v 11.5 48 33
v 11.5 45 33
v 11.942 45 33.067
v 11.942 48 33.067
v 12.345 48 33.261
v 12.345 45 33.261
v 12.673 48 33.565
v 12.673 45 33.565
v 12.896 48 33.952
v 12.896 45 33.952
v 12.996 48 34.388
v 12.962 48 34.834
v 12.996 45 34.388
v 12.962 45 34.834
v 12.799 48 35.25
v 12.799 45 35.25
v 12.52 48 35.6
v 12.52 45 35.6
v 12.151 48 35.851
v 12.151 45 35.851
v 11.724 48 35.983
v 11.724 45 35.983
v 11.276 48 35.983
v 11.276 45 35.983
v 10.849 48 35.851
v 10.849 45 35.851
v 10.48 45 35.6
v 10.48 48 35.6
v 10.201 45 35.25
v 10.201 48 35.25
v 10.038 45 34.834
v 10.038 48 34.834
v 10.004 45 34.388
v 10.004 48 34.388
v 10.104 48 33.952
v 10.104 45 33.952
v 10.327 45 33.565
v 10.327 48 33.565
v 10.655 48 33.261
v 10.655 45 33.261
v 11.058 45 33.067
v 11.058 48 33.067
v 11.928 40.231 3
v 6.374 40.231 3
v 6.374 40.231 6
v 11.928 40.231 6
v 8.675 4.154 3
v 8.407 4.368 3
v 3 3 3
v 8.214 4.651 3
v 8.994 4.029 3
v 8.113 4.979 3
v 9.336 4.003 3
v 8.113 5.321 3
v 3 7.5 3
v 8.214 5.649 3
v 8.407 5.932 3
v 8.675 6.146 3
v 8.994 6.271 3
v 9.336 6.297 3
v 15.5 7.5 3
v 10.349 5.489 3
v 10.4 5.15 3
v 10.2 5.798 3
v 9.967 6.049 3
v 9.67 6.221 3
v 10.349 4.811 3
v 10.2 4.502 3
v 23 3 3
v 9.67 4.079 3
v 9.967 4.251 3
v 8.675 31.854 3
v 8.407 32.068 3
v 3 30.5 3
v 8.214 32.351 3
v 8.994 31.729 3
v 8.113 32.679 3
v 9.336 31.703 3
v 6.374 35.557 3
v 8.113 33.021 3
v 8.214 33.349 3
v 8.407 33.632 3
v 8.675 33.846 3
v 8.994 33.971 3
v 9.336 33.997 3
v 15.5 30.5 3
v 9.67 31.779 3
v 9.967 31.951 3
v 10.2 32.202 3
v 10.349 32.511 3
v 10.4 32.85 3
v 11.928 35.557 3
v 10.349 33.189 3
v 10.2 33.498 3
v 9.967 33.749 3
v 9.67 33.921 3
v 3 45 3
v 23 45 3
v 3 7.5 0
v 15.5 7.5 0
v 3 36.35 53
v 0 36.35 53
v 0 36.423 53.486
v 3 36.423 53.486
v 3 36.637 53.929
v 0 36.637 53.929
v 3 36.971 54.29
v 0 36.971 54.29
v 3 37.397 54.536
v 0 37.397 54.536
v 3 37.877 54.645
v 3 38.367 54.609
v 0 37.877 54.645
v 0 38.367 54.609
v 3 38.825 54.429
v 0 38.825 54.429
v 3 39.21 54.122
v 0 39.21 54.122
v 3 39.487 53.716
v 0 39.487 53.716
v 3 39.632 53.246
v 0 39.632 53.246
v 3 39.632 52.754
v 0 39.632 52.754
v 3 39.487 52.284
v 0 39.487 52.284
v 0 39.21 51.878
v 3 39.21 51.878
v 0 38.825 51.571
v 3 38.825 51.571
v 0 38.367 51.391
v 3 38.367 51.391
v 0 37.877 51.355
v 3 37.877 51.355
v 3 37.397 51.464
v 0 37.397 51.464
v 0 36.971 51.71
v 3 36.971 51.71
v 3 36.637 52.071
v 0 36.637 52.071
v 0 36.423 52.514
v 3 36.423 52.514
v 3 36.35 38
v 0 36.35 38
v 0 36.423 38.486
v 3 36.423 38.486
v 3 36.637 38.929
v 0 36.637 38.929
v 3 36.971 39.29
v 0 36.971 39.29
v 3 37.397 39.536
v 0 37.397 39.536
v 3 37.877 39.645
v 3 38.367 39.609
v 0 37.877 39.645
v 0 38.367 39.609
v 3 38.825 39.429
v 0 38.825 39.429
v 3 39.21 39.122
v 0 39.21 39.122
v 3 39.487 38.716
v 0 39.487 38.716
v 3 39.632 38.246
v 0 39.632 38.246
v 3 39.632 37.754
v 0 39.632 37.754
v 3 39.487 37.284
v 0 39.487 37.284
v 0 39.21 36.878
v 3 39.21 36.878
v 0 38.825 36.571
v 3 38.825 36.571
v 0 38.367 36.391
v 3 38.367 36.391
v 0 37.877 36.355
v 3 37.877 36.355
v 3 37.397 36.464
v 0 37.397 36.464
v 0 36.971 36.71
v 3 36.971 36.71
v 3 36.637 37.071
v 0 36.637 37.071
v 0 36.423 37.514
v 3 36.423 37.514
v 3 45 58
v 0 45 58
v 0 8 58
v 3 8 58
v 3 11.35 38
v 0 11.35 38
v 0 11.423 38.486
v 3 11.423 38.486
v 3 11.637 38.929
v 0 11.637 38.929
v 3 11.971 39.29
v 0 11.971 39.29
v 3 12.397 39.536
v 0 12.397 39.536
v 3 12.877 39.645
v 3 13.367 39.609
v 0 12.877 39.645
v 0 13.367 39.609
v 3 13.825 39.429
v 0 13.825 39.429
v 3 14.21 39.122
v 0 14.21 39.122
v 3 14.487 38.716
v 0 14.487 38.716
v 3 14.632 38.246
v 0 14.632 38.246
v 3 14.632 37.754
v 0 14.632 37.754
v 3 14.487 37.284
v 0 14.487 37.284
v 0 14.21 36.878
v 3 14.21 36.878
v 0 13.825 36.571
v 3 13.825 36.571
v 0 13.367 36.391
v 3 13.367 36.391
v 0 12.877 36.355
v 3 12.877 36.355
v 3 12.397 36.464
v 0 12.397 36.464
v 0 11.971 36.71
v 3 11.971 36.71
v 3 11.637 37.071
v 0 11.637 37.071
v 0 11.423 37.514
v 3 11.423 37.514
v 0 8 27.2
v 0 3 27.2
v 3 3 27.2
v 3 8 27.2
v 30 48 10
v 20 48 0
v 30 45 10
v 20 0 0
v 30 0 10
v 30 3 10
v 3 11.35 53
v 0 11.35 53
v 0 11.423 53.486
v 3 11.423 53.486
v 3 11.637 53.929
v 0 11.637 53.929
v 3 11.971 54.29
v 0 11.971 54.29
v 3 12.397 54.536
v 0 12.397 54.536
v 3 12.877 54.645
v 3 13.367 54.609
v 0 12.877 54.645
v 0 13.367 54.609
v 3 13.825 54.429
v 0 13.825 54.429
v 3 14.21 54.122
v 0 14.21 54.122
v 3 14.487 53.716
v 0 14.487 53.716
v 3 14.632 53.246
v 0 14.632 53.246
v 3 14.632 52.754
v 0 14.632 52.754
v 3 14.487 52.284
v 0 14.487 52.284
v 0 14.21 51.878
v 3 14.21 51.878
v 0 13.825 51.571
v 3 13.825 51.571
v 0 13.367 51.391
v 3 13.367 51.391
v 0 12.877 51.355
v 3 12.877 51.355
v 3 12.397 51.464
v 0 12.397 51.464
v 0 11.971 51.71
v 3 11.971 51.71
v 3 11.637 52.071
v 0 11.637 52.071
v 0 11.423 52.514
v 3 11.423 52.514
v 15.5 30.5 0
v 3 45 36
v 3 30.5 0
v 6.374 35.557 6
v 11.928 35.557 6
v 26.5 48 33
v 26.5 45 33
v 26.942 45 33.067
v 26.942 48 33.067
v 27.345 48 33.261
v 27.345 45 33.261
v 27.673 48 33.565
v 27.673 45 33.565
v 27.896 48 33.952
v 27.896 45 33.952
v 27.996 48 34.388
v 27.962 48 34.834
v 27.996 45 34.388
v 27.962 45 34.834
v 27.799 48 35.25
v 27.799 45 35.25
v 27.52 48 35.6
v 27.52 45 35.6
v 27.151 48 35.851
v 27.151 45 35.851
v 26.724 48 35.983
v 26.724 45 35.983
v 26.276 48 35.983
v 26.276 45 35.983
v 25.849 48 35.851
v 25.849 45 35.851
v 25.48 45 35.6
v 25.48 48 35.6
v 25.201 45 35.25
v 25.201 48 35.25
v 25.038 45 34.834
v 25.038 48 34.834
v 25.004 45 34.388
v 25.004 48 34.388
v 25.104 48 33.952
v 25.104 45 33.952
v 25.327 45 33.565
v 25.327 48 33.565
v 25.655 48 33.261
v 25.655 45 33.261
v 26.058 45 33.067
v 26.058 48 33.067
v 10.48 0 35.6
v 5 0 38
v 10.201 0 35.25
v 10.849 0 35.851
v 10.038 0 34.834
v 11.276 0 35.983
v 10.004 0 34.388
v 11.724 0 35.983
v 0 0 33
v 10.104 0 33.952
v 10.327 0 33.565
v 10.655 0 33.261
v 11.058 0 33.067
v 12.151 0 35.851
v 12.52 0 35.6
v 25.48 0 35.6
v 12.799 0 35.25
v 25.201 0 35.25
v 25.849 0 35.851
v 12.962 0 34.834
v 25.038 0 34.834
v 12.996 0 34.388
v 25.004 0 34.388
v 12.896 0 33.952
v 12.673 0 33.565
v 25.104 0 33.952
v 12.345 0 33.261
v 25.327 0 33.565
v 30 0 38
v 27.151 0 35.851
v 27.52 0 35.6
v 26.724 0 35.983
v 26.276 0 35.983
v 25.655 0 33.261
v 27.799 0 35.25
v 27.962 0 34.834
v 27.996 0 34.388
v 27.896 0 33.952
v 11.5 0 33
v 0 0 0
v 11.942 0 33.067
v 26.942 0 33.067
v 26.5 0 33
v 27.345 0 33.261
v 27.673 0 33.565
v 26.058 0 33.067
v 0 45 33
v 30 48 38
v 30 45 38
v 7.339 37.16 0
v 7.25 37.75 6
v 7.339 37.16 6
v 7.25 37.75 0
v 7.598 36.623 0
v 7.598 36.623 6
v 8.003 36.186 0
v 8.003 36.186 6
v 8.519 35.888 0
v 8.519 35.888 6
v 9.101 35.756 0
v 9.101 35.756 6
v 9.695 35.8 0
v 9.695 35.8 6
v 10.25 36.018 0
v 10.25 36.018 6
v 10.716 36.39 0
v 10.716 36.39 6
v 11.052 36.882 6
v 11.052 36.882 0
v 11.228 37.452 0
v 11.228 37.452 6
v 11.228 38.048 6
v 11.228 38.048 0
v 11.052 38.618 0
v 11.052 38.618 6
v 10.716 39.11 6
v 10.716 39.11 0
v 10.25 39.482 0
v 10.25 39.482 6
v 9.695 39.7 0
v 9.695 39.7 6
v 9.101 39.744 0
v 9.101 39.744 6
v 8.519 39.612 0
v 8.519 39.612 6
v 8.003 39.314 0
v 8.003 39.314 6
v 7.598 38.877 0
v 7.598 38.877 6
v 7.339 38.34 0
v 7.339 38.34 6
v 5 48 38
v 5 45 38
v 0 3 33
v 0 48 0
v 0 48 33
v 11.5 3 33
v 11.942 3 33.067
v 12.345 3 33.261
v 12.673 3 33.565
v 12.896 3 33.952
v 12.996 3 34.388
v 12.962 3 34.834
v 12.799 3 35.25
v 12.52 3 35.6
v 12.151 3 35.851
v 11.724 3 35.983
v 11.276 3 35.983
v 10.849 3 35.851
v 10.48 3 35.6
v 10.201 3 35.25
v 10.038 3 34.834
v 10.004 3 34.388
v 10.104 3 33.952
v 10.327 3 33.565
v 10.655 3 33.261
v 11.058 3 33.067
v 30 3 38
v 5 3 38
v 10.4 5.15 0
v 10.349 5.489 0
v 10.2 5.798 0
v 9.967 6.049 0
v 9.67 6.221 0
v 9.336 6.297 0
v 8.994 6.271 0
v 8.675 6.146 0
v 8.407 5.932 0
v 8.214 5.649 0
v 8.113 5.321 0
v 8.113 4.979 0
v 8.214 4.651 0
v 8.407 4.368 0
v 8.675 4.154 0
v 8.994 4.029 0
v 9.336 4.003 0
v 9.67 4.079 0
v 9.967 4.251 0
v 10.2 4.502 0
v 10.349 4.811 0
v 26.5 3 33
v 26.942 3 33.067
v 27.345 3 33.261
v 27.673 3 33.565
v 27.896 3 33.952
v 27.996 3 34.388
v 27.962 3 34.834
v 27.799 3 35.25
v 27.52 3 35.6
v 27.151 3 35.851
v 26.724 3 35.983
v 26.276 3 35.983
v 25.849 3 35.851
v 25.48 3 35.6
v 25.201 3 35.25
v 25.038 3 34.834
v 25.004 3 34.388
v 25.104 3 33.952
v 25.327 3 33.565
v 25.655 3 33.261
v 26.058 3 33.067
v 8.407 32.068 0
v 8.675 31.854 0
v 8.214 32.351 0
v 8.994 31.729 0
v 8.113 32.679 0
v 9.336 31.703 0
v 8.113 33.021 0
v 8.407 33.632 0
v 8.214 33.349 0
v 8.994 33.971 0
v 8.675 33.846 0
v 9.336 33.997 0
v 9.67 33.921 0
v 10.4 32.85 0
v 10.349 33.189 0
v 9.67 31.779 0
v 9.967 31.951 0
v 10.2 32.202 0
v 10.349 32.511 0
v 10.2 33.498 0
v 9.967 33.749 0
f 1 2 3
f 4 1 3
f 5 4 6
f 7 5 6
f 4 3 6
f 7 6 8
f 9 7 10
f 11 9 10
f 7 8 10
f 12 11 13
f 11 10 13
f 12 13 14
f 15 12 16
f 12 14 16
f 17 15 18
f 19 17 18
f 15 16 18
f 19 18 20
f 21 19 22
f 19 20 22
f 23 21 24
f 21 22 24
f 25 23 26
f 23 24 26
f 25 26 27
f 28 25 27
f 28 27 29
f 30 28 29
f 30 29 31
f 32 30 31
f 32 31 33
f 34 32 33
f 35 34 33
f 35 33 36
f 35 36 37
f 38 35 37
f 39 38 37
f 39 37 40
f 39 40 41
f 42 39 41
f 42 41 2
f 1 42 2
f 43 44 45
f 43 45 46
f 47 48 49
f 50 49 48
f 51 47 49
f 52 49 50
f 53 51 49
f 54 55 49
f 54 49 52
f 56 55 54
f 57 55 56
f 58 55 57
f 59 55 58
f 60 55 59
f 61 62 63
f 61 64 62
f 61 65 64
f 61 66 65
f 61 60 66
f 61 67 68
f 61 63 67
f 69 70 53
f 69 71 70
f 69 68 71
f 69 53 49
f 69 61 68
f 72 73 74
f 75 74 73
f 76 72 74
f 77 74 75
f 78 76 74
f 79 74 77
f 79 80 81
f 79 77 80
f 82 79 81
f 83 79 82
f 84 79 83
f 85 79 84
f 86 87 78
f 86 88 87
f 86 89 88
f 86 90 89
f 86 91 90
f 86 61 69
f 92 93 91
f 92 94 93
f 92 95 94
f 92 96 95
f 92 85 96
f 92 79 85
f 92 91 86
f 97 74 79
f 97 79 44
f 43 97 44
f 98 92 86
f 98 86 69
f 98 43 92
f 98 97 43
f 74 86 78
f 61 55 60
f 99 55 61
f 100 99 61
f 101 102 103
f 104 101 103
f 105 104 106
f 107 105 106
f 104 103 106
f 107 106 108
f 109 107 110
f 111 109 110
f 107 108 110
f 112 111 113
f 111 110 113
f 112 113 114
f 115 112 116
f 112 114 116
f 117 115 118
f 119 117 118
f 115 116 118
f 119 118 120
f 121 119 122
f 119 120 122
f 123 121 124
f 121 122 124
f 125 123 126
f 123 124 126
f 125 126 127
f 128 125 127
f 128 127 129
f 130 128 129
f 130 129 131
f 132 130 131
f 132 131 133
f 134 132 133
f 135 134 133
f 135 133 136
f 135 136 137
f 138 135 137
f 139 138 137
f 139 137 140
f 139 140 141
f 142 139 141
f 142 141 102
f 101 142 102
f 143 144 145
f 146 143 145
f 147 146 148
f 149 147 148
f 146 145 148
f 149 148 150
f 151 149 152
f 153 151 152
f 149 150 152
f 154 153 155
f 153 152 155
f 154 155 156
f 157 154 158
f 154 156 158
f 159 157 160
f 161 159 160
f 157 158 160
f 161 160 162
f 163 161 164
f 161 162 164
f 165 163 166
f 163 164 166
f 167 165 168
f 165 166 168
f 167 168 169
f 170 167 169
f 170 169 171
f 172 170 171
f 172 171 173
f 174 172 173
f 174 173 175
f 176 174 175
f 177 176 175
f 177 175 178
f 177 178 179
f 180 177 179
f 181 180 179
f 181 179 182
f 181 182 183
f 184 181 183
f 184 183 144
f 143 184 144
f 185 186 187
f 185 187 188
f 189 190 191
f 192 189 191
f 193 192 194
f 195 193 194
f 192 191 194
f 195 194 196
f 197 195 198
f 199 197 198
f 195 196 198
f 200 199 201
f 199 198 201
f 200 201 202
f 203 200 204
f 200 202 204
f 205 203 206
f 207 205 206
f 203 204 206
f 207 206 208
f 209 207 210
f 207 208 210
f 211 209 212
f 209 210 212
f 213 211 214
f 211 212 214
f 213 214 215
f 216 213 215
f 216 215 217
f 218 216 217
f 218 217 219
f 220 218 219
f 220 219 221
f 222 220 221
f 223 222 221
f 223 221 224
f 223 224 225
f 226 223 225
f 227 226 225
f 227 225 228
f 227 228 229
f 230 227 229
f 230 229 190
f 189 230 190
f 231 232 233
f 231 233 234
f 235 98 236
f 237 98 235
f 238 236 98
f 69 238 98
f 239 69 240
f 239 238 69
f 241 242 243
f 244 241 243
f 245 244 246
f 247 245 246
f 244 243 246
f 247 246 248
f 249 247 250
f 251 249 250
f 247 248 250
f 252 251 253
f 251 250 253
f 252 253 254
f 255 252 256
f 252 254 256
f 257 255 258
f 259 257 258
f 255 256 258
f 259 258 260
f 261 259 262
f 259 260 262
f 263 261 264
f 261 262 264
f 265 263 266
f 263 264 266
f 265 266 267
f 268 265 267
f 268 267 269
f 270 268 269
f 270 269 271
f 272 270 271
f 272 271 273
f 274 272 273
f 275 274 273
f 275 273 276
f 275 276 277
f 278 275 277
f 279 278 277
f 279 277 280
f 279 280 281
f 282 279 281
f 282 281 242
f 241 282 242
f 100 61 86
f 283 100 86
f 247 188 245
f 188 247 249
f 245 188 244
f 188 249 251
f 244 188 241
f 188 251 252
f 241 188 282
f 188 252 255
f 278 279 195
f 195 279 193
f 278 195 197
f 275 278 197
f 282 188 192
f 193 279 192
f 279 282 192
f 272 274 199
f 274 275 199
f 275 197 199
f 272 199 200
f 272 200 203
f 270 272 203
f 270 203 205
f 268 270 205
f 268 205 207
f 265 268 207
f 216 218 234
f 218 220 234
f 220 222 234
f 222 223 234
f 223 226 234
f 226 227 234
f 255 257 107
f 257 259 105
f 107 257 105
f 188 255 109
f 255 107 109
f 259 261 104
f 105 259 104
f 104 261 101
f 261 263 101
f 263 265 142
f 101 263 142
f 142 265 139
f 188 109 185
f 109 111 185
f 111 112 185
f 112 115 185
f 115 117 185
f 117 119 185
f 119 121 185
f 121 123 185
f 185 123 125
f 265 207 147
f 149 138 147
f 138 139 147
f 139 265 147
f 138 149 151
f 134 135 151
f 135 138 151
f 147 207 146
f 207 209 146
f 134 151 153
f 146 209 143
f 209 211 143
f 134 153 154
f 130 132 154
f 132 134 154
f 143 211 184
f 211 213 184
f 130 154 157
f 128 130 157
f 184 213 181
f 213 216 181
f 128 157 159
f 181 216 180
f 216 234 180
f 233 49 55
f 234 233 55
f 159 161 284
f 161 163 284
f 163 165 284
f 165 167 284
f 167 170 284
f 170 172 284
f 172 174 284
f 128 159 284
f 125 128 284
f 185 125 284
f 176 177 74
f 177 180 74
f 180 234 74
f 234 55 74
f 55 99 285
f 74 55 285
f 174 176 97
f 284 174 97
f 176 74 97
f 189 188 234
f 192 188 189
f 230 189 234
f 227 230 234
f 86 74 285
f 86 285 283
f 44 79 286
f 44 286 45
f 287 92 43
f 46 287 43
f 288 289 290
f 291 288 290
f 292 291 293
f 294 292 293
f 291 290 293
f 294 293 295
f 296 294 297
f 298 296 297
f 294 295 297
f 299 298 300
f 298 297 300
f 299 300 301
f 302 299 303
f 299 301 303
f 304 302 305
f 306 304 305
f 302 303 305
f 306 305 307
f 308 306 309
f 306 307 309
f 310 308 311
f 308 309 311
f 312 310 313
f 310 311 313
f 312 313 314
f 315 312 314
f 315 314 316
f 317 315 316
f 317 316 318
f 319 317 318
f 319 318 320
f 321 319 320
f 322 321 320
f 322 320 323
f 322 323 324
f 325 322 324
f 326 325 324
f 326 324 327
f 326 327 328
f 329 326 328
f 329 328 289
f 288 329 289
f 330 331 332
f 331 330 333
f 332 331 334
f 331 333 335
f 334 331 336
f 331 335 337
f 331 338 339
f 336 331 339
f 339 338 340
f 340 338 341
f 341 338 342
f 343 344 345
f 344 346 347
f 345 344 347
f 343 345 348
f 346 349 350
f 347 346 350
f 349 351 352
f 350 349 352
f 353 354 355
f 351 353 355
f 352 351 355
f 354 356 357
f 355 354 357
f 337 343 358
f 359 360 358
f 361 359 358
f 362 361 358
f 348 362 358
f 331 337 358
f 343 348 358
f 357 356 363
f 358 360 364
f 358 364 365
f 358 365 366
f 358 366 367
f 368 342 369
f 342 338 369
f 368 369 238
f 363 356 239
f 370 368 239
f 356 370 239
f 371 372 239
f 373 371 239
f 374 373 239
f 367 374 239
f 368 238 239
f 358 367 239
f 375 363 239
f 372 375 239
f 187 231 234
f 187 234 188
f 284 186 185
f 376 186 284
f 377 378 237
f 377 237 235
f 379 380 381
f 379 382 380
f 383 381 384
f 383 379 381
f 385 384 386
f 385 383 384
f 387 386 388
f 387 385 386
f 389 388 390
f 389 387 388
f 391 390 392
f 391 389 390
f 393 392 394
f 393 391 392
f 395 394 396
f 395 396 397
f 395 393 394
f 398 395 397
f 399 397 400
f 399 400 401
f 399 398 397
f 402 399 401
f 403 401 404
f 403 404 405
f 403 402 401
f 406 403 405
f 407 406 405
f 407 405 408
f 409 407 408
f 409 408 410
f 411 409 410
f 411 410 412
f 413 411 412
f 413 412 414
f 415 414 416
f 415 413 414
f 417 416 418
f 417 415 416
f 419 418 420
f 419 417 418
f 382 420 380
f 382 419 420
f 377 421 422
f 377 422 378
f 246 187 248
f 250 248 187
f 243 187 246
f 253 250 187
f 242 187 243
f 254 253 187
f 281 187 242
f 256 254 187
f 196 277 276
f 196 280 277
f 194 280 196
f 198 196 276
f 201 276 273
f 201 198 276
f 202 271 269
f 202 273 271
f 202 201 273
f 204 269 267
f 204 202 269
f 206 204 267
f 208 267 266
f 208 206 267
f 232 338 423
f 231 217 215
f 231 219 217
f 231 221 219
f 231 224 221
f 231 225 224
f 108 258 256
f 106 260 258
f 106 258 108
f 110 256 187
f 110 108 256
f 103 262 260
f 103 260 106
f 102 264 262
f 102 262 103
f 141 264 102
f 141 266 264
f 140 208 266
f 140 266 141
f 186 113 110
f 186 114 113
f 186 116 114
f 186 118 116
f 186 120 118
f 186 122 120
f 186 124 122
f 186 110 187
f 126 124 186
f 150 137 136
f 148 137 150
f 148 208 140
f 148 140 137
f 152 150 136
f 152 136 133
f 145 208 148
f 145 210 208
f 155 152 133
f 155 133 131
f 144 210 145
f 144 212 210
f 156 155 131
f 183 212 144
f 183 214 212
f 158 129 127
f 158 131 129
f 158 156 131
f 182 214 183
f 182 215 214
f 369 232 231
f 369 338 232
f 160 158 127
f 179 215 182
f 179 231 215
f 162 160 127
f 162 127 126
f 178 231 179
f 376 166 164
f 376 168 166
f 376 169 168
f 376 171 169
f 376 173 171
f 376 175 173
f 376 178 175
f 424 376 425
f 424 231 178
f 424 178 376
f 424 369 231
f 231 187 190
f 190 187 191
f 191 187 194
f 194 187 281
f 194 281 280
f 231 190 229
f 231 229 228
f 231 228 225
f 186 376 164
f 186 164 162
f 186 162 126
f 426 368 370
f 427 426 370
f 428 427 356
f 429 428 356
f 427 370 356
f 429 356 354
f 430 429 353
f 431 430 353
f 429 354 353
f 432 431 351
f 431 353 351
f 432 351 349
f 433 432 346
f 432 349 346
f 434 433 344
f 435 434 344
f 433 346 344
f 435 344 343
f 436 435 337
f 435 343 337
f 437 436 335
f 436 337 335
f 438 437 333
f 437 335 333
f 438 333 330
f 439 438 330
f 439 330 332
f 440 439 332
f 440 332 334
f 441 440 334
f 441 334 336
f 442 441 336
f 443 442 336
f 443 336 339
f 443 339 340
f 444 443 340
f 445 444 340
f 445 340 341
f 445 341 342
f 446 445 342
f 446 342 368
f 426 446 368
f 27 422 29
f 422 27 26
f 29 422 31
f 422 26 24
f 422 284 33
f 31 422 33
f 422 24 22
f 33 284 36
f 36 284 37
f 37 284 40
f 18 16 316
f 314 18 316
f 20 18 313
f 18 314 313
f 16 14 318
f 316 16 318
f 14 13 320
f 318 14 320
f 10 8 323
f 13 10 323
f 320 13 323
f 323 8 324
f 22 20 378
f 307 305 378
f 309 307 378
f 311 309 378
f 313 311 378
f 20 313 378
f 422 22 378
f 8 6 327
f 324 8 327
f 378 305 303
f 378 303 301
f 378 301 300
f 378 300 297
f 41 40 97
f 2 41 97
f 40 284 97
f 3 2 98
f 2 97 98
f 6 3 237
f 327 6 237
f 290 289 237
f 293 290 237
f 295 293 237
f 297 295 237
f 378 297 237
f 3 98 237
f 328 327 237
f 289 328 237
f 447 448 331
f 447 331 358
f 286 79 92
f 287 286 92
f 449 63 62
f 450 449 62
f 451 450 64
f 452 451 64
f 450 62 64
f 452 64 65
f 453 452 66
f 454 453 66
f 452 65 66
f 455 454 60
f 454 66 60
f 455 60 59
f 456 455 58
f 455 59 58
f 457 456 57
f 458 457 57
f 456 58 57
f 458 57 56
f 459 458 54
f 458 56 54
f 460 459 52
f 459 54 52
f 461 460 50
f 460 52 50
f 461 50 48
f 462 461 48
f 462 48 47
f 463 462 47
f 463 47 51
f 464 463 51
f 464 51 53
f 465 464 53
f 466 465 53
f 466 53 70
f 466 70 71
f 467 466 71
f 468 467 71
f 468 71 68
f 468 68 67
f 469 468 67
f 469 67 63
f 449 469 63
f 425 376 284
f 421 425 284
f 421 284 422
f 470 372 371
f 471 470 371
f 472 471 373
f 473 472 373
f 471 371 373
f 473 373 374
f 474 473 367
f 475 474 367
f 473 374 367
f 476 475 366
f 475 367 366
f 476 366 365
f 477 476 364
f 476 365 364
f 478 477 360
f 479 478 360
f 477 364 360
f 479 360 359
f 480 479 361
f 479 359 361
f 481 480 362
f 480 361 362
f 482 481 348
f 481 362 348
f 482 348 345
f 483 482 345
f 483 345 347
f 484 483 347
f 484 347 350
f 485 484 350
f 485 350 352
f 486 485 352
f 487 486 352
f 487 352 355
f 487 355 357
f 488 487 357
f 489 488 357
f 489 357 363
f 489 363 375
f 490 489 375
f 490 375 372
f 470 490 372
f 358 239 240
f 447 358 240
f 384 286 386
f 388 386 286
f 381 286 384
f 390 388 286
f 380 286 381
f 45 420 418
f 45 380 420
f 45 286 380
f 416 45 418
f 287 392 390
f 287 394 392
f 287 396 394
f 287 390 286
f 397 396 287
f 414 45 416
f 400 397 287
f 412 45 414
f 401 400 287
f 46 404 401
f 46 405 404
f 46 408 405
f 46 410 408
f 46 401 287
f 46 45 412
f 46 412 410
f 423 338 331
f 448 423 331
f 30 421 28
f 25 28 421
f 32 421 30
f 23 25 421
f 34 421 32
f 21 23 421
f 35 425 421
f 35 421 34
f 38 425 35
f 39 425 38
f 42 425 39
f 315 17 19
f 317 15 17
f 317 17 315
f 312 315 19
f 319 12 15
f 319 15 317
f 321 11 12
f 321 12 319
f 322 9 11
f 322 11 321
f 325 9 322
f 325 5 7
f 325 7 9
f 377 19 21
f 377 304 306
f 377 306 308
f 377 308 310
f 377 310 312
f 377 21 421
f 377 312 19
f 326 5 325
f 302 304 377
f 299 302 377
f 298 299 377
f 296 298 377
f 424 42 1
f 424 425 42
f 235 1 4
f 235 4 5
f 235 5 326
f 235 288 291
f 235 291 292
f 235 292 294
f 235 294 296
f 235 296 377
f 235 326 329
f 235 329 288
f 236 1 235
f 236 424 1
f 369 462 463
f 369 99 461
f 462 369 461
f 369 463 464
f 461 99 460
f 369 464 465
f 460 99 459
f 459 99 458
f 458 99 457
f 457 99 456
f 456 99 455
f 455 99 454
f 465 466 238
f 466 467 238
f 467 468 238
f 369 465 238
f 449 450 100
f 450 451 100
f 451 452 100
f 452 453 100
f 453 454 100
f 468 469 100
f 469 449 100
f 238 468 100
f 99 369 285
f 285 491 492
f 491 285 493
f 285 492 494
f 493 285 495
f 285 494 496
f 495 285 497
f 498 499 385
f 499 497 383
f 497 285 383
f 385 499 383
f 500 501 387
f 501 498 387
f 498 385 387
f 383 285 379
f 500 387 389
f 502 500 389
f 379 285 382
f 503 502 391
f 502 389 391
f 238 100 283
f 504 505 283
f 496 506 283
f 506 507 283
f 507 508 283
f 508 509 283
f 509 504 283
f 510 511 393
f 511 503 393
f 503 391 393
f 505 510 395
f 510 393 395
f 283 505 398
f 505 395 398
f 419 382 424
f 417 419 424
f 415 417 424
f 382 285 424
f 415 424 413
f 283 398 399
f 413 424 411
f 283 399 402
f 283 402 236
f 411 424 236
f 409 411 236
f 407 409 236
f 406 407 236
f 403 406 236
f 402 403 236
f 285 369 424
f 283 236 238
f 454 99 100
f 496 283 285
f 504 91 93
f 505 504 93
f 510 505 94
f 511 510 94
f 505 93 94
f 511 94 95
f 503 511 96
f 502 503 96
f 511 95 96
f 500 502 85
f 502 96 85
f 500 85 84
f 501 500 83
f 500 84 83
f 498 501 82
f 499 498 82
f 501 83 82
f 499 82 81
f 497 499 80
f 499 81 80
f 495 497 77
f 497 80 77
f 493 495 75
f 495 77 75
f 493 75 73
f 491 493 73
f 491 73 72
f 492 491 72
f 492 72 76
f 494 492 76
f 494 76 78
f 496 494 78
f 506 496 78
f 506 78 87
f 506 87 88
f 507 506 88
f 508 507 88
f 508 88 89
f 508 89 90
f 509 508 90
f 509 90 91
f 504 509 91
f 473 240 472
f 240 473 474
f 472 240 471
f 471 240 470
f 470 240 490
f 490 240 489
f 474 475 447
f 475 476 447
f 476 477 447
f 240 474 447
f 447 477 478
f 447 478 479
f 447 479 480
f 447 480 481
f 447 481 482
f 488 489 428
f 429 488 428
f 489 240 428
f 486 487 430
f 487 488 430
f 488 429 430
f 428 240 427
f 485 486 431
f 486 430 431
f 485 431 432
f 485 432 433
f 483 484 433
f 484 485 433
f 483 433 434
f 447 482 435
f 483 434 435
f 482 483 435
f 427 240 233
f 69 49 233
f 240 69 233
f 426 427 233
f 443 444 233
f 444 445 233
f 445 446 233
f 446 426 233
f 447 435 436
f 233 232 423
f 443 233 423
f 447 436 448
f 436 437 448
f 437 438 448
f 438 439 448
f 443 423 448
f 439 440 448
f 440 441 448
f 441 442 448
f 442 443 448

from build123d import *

# Parameters (mm, degrees)
SKETCH_1_W           = 30
SKETCH_1_H           = 48
EXTRUDE_1_DEPTH      = 3
SKETCH_3_W           = 30
SKETCH_3_H           = 3
EXTRUDE_2_DEPTH      = 35
CUT_EXTRUDE_2_DEPTH  = 69.176242196
CUT_EXTRUDE_3_DEPTH  = 69.176242196
SKETCH_7_W           = 3
SKETCH_7_H           = 42
EXTRUDE_3_DEPTH      = 25
SKETCH_14_W          = 3
SKETCH_14_H          = 42
EXTRUDE_6_DEPTH      = 30
SKETCH_15_R          = 1.65
CUT_EXTRUDE_6_DEPTH  = 4
SKETCH_16_R          = 1.15
SKETCH_16_W          = 12.5
SKETCH_16_H          = 23
CUT_EXTRUDE_7_DEPTH  = 10
SKETCH_17_W          = 30.8
SKETCH_17_H          = 5
CUT_EXTRUDE_8_DEPTH  = 10
SKETCH_20_R          = 1.5
CUT_EXTRUDE_11_DEPTH = 82.043198357
CUT_EXTRUDE_12_REACH = 83.043
SKETCH_22_R          = 2
SKETCH_23_W          = 5.554421841
SKETCH_23_H          = 4.674351411
SKETCH_23_R          = 2
EXTRUDE_9_DEPTH      = 3


with BuildPart() as part:
    # 草图1 → 凸台-拉伸1 (new body)
    with BuildSketch(Plane.XY):
        with Locations((15, 24)):
            Rectangle(SKETCH_1_W, SKETCH_1_H)
    extrude(amount=EXTRUDE_1_DEPTH)

    # 草图3 → 凸台-拉伸2 (add)
    with BuildSketch(Plane.XY.offset(3)):
        with Locations((15, 46.5)):
            Rectangle(SKETCH_3_W, SKETCH_3_H)
        with Locations((15, 1.5)):
            Rectangle(SKETCH_3_W, SKETCH_3_H)
    extrude(amount=EXTRUDE_2_DEPTH)

    # 草图5 → 切除-拉伸2 (cut, through all)
    with BuildSketch(Plane.XZ):
        Polygon((0, 33), (5, 38), (0, 38), align=None)
    extrude(amount=-CUT_EXTRUDE_2_DEPTH, mode=Mode.SUBTRACT)

    # 草图6 → 切除-拉伸3 (cut, through all)
    with BuildSketch(Plane.XZ):
        Polygon((20, 0), (30, 10), (30, 0), align=None)
    extrude(amount=-CUT_EXTRUDE_3_DEPTH, mode=Mode.SUBTRACT)

    # 草图7 → 凸台-拉伸3 (add)
    with BuildSketch(Plane.XY.offset(3)):
        with Locations((1.5, 24)):
            Rectangle(SKETCH_7_W, SKETCH_7_H)
    extrude(amount=EXTRUDE_3_DEPTH)

    # 草图14 → 凸台-拉伸6 (add)
    with BuildSketch(Plane.XY.offset(28)):
        with Locations((1.5, 24)):
            Rectangle(SKETCH_14_W, SKETCH_14_H)
    extrude(amount=EXTRUDE_6_DEPTH)

    # 草图15 → 切除-拉伸6 (cut)
    with BuildSketch(Plane.ZY):
        with Locations(Location((38, 13, 0), (0, 0, 270))):
            Circle(SKETCH_15_R)
        with Locations(Location((38, 38, 0), (0, 0, 270))):
            Circle(SKETCH_15_R)
        with Locations(Location((53, 38, 0), (0, 0, 270))):
            Circle(SKETCH_15_R)
        with Locations(Location((53, 13, 0), (0, 0, 270))):
            Circle(SKETCH_15_R)
    extrude(amount=-CUT_EXTRUDE_6_DEPTH, mode=Mode.SUBTRACT)

    # 草图16 → 切除-拉伸7 (cut)
    with BuildSketch(Plane.XY.offset(3)):
        with Locations((9.25, 32.85)):
            Circle(SKETCH_16_R)
        with Locations((9.25, 5.15)):
            Circle(SKETCH_16_R)
        with Locations((9.25, 19)):
            Rectangle(SKETCH_16_W, SKETCH_16_H)
    extrude(amount=-CUT_EXTRUDE_7_DEPTH, mode=Mode.SUBTRACT)

    # 草图17 → 切除-拉伸8 (cut)
    with BuildSketch(Plane.ZY):
        with Locations((42.6, 5.5)):
            Rectangle(SKETCH_17_W, SKETCH_17_H)
    extrude(amount=-CUT_EXTRUDE_8_DEPTH, mode=Mode.SUBTRACT)

    # 草图20 → 切除-拉伸11 (cut, through all)
    with BuildSketch(Plane.XZ):
        with Locations(Location((26.5, 34.5, 0), (0, 0, 270))):
            Circle(SKETCH_20_R)
        with Locations(Location((11.5, 34.5, 0), (0, 0, 270))):
            Circle(SKETCH_20_R)
    extrude(amount=-CUT_EXTRUDE_11_DEPTH, mode=Mode.SUBTRACT)

    # 草图22 → 切除-拉伸12 (cut, up to next)
    with BuildSketch(Plane(origin=(0, 0, 0), x_dir=(-1, 0, 0), z_dir=(0, 0, -1)), mode=Mode.PRIVATE) as cut_extrude_12_sk1:
        with Locations((-9.25, 37.75)):
            Circle(SKETCH_22_R)
    cut_extrude_12_tool1 = extrude(cut_extrude_12_sk1.sketch, amount=-CUT_EXTRUDE_12_REACH, mode=Mode.PRIVATE) & part.part
    add(cut_extrude_12_tool1.solids().sort_by_distance((9.25, 37.75, 0))[0], mode=Mode.SUBTRACT)

    # 草图23 → 凸台-拉伸9 (add)
    with BuildSketch(Plane.XY.offset(3)):
        with Locations((9.150966926, 37.89409872)):
            Rectangle(SKETCH_23_W, SKETCH_23_H)
        with Locations(Location((9.25, 37.75, 0), (0, 0, 180))):
            Circle(SKETCH_23_R, mode=Mode.SUBTRACT)
    extrude(amount=EXTRUDE_9_DEPTH)


solid = part.part
